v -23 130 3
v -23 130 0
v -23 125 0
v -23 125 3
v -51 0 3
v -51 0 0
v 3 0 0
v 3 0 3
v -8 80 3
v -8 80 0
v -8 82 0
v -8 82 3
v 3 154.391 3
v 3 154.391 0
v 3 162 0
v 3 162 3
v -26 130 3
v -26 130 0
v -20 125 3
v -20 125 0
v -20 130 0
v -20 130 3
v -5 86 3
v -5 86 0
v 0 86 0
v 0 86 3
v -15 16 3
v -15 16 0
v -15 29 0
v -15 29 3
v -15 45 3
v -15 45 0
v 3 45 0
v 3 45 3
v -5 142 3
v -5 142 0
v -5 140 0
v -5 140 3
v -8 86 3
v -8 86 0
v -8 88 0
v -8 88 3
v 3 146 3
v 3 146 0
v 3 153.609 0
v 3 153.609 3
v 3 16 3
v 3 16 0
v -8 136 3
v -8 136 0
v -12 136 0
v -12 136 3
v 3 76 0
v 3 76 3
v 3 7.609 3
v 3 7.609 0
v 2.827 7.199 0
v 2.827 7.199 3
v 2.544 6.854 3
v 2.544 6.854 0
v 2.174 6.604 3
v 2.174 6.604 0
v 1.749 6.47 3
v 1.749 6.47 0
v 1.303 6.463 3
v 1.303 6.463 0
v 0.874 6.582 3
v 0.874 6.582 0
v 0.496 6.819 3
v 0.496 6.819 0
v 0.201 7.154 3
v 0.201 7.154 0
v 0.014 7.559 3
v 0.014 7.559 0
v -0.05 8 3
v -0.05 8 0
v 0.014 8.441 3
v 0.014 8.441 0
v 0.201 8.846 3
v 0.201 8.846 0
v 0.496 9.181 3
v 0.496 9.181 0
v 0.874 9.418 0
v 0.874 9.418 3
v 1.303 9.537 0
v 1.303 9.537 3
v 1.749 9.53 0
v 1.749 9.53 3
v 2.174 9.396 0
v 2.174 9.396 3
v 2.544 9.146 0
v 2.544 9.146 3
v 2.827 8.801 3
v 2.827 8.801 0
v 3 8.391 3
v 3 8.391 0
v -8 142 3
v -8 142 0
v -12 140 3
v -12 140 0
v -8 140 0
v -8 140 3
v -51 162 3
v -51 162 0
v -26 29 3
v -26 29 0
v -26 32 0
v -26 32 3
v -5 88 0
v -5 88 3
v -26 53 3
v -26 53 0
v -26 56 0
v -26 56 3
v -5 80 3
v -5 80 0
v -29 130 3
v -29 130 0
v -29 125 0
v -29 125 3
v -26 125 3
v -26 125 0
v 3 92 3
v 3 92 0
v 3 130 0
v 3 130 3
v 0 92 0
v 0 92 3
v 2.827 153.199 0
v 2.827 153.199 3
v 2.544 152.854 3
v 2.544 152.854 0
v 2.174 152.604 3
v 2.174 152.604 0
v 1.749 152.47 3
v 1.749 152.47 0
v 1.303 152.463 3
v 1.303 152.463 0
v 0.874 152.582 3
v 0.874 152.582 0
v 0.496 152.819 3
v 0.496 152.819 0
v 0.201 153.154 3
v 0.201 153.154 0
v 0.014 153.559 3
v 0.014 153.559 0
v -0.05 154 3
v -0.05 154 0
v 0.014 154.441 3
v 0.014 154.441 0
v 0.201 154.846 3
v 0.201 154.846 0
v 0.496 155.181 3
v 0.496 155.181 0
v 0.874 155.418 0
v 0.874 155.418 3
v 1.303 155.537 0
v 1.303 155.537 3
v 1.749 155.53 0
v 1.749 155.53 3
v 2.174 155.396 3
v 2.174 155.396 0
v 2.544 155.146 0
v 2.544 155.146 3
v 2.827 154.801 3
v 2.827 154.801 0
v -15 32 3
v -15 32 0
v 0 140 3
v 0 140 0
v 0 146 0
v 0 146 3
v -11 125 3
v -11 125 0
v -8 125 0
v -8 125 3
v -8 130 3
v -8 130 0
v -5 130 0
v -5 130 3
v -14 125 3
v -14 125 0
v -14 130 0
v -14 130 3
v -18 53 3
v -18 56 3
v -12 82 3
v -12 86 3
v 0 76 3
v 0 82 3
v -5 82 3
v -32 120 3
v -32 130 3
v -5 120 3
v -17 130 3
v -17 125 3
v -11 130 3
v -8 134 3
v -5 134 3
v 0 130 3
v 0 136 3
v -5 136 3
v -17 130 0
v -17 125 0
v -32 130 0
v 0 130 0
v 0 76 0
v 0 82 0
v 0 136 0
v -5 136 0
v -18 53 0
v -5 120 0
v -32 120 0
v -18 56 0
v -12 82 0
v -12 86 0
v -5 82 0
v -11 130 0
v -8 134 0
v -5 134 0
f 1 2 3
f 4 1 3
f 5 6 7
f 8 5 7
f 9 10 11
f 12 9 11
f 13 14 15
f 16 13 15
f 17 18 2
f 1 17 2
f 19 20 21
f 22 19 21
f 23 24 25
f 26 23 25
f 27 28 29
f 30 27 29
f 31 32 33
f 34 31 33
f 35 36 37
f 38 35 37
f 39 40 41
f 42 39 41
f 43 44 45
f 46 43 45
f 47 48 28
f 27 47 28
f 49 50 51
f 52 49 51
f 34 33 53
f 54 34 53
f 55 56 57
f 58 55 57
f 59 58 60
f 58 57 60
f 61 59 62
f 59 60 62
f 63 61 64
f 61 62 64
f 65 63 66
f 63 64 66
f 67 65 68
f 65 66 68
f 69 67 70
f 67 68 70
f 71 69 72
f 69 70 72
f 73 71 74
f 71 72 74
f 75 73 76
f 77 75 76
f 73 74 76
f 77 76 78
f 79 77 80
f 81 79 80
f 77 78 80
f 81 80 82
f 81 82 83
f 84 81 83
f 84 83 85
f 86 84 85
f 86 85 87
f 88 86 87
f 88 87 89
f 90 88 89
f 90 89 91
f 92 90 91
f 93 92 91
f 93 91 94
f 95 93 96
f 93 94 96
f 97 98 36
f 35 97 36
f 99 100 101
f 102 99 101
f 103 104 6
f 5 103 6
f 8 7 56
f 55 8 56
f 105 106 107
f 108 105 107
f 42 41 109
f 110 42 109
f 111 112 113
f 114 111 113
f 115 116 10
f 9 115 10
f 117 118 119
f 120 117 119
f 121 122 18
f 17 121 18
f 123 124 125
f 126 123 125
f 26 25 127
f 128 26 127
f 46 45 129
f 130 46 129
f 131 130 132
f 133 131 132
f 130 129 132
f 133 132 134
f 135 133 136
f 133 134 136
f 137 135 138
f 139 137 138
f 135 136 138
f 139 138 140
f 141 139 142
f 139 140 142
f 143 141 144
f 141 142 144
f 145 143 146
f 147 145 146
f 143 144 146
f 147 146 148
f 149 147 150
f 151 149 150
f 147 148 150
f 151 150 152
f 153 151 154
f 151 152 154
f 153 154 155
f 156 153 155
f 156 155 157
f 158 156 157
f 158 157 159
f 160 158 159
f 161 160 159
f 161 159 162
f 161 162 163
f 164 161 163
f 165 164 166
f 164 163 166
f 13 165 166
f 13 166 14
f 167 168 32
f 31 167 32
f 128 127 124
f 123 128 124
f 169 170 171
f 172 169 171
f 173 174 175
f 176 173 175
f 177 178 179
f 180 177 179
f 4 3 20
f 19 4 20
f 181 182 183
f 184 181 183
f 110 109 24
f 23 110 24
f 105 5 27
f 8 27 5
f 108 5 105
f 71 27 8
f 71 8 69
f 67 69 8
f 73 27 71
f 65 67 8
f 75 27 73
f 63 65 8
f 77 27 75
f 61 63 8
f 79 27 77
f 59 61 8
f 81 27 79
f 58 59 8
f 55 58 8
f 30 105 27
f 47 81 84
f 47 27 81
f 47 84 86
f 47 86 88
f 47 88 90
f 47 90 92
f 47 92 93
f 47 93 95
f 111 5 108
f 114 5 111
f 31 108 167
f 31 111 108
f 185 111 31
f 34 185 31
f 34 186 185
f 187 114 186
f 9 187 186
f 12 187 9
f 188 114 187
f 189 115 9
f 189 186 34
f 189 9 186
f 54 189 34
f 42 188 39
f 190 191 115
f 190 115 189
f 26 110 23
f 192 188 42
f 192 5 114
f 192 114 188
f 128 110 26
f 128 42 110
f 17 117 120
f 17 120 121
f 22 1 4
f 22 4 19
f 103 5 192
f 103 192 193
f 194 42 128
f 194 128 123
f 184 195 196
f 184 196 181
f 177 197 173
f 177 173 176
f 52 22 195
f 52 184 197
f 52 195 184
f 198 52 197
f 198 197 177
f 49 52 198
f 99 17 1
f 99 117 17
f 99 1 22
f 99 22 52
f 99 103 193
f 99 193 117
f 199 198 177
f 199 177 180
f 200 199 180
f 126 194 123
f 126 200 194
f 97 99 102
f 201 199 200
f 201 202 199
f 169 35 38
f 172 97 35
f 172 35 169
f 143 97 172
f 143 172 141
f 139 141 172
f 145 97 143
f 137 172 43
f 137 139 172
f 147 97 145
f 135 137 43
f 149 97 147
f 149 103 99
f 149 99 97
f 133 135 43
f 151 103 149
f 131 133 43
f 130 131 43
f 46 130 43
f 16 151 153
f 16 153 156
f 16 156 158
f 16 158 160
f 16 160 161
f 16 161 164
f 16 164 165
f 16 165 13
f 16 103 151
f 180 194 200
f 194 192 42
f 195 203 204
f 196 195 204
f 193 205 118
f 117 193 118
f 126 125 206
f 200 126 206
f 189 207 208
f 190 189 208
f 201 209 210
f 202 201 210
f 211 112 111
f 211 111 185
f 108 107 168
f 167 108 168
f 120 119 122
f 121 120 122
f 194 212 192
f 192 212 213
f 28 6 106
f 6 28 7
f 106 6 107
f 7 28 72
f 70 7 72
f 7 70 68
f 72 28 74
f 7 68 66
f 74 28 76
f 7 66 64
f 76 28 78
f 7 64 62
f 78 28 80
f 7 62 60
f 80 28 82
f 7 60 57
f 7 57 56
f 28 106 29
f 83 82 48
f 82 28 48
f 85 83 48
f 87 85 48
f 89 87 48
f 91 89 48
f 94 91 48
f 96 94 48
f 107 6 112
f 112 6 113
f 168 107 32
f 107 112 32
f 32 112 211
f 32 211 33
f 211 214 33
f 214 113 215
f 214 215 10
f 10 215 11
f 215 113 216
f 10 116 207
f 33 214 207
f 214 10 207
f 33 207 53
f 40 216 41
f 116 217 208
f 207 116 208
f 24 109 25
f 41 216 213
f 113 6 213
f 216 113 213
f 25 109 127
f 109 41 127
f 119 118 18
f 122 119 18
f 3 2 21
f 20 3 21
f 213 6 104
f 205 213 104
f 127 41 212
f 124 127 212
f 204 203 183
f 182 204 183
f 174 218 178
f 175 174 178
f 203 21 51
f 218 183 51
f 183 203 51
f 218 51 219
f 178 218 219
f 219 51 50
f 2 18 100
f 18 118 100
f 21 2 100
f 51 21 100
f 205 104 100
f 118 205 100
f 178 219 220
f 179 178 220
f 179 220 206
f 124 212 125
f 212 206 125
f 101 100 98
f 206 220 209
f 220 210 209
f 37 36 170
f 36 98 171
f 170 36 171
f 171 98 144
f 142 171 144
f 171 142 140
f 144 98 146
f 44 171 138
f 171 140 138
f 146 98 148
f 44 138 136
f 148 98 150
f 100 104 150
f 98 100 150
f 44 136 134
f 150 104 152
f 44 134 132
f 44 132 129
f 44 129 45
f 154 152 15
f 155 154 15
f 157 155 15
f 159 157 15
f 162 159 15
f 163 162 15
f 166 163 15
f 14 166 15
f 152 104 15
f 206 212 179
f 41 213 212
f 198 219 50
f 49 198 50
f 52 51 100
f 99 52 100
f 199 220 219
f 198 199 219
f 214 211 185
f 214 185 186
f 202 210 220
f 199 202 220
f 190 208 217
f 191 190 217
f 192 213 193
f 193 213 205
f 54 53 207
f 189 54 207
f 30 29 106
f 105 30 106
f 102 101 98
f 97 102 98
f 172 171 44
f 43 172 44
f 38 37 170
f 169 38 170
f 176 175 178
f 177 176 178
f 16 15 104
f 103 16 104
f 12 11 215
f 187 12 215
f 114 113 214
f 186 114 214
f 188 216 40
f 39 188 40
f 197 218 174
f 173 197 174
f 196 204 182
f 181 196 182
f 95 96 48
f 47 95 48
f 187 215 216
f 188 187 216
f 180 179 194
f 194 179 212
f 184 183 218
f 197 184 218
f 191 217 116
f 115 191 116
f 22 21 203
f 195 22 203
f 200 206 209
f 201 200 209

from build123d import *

# Parameters (mm, degrees)
SKETCH_1_W      = 8
SKETCH_1_H      = 3
EXTRUDE_1_DEPTH = 3


with BuildPart() as part:
    # 草图1 → 凸台-拉伸1 (new body)
    with BuildSketch(Plane.XY):
        with BuildLine():
            Line((0, 140), (0, 146))
            Line((0, 146), (3, 146))
            Line((3, 146), (3, 153.609487516))
            ThreePointArc((3, 153.609487516), (-0.05, 154), (3, 154.390512484))
            Line((3, 154.390512484), (3, 162))
            Line((3, 162), (0, 162))
            Line((0, 162), (-51, 162))
            Line((-51, 162), (-51, 0))
            Line((-51, 0), (0, 0))
            Line((0, 0), (3, 0))
            Line((3, 0), (3, 7.609487516))
            ThreePointArc((3, 7.609487516), (-0.05, 8), (3, 8.390512484))
            Line((3, 8.390512484), (3, 16))
            Line((3, 16), (0, 16))
            Line((0, 16), (-15, 16))
            Line((-15, 16), (-15, 29))
            Line((-15, 29), (-18, 29))
            Line((-18, 29), (-26, 29))
            Line((-26, 29), (-26, 32))
            Line((-26, 32), (-18, 32))
            Line((-18, 32), (-15, 32))
            Line((-15, 32), (-15, 45))
            Line((-15, 45), (0, 45))
            Line((0, 45), (3, 45))
            Line((3, 45), (3, 76))
            Line((3, 76), (0, 76))
            Line((0, 76), (0, 82))
            Line((0, 82), (-5, 82))
            Line((-5, 82), (-5, 80))
            Line((-5, 80), (-8, 80))
            Line((-8, 80), (-8, 82))
            Line((-8, 82), (-12, 82))
            Line((-12, 82), (-12, 86))
            Line((-12, 86), (-8, 86))
            Line((-8, 86), (-8, 88))
            Line((-8, 88), (-5, 88))
            Line((-5, 88), (-5, 86))
            Line((-5, 86), (0, 86))
            Line((0, 86), (0, 92))
            Line((0, 92), (3, 92))
            Line((3, 92), (3, 130))
            Line((3, 130), (0, 130))
            Line((0, 130), (0, 136))
            Line((0, 136), (-5, 136))
            Line((-5, 136), (-5, 134))
            Line((-5, 134), (-8, 134))
            Line((-8, 134), (-8, 136))
            Line((-8, 136), (-12, 136))
            Line((-12, 136), (-12, 140))
            Line((-12, 140), (-8, 140))
            Line((-8, 140), (-8, 142))
            Line((-8, 142), (-5, 142))
            Line((-5, 142), (-5, 140))
            Line((-5, 140), (0, 140))
        make_face()
        with Locations((-22, 54.5)):
            Rectangle(SKETCH_1_W, SKETCH_1_H, mode=Mode.SUBTRACT)
        Polygon((-11, 125), (-8, 125), (-8, 130), (-5, 130), (-5, 120), (-32, 120), (-32, 130), (-29, 130), (-29, 125), (-26, 125), (-26, 130), (-23, 130), (-23, 125), (-20, 125), (-20, 130), (-17, 130), (-17, 125), (-14, 125), (-14, 130), (-11, 130), align=None, mode=Mode.SUBTRACT)
    extrude(amount=EXTRUDE_1_DEPTH)


solid = part.part
